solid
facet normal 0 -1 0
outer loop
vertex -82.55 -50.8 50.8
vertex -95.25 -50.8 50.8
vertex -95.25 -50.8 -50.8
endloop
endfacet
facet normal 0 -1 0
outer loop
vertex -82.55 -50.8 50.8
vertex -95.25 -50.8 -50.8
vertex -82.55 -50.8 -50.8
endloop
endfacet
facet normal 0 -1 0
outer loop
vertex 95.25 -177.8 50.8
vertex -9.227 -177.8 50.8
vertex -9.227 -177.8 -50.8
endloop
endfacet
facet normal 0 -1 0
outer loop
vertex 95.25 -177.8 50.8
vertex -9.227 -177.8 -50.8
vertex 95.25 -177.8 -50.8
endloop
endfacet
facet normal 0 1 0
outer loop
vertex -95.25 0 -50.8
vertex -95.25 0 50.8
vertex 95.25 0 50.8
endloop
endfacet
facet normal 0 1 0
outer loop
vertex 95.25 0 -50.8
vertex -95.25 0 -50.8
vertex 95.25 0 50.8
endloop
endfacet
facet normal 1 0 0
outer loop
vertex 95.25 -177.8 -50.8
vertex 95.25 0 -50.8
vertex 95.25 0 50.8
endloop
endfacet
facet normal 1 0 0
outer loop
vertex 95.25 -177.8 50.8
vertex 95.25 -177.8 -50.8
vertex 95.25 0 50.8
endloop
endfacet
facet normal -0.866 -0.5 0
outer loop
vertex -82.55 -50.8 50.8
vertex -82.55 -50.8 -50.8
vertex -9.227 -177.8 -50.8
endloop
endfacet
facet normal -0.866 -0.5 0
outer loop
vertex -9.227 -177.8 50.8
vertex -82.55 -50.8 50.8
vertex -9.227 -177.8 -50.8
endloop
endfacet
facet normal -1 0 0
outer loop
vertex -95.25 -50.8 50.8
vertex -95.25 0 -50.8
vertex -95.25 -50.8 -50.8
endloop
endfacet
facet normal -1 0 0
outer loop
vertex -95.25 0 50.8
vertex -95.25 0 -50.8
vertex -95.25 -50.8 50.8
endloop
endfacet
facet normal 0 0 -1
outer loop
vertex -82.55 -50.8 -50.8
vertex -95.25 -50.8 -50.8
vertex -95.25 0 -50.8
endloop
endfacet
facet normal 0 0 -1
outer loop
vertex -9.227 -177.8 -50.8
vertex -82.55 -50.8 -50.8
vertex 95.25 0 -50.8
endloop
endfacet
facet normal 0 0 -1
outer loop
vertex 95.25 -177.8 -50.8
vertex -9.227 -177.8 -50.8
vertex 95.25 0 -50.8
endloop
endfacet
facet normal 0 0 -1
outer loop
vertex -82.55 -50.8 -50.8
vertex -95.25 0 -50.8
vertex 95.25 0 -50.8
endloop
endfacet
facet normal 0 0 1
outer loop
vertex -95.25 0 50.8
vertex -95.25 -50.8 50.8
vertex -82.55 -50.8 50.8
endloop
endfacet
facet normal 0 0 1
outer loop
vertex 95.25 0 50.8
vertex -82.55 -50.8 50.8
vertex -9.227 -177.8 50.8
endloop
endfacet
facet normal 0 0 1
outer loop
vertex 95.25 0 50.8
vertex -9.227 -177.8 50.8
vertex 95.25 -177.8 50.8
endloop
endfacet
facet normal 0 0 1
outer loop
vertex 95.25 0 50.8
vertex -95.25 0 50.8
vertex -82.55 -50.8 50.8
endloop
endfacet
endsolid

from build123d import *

# Parameters (mm, degrees)
F0_W     = 190.5
F0_H     = 101.6
F1_DEPTH = 177.8
F3_DEPTH = 101.601


with BuildPart() as f1:
    # F0 (on Front) → F1 (new body)
    with BuildSketch(Plane.XZ):
        Rectangle(F0_W, F0_H)
    extrude(amount=F1_DEPTH)

    # F2 (on face) → F3 (cut, through all)
    with BuildSketch(Plane(origin=(0, 0, -50.8), x_dir=(1, 0, 0), z_dir=(0, 0, -1))):
        Polygon((-95.25, 177.8), (-95.25, 50.8), (-82.55, 50.8), (-9.226516, 177.8), align=None)
    extrude(amount=-F3_DEPTH, mode=Mode.SUBTRACT)


solid = f1.part
